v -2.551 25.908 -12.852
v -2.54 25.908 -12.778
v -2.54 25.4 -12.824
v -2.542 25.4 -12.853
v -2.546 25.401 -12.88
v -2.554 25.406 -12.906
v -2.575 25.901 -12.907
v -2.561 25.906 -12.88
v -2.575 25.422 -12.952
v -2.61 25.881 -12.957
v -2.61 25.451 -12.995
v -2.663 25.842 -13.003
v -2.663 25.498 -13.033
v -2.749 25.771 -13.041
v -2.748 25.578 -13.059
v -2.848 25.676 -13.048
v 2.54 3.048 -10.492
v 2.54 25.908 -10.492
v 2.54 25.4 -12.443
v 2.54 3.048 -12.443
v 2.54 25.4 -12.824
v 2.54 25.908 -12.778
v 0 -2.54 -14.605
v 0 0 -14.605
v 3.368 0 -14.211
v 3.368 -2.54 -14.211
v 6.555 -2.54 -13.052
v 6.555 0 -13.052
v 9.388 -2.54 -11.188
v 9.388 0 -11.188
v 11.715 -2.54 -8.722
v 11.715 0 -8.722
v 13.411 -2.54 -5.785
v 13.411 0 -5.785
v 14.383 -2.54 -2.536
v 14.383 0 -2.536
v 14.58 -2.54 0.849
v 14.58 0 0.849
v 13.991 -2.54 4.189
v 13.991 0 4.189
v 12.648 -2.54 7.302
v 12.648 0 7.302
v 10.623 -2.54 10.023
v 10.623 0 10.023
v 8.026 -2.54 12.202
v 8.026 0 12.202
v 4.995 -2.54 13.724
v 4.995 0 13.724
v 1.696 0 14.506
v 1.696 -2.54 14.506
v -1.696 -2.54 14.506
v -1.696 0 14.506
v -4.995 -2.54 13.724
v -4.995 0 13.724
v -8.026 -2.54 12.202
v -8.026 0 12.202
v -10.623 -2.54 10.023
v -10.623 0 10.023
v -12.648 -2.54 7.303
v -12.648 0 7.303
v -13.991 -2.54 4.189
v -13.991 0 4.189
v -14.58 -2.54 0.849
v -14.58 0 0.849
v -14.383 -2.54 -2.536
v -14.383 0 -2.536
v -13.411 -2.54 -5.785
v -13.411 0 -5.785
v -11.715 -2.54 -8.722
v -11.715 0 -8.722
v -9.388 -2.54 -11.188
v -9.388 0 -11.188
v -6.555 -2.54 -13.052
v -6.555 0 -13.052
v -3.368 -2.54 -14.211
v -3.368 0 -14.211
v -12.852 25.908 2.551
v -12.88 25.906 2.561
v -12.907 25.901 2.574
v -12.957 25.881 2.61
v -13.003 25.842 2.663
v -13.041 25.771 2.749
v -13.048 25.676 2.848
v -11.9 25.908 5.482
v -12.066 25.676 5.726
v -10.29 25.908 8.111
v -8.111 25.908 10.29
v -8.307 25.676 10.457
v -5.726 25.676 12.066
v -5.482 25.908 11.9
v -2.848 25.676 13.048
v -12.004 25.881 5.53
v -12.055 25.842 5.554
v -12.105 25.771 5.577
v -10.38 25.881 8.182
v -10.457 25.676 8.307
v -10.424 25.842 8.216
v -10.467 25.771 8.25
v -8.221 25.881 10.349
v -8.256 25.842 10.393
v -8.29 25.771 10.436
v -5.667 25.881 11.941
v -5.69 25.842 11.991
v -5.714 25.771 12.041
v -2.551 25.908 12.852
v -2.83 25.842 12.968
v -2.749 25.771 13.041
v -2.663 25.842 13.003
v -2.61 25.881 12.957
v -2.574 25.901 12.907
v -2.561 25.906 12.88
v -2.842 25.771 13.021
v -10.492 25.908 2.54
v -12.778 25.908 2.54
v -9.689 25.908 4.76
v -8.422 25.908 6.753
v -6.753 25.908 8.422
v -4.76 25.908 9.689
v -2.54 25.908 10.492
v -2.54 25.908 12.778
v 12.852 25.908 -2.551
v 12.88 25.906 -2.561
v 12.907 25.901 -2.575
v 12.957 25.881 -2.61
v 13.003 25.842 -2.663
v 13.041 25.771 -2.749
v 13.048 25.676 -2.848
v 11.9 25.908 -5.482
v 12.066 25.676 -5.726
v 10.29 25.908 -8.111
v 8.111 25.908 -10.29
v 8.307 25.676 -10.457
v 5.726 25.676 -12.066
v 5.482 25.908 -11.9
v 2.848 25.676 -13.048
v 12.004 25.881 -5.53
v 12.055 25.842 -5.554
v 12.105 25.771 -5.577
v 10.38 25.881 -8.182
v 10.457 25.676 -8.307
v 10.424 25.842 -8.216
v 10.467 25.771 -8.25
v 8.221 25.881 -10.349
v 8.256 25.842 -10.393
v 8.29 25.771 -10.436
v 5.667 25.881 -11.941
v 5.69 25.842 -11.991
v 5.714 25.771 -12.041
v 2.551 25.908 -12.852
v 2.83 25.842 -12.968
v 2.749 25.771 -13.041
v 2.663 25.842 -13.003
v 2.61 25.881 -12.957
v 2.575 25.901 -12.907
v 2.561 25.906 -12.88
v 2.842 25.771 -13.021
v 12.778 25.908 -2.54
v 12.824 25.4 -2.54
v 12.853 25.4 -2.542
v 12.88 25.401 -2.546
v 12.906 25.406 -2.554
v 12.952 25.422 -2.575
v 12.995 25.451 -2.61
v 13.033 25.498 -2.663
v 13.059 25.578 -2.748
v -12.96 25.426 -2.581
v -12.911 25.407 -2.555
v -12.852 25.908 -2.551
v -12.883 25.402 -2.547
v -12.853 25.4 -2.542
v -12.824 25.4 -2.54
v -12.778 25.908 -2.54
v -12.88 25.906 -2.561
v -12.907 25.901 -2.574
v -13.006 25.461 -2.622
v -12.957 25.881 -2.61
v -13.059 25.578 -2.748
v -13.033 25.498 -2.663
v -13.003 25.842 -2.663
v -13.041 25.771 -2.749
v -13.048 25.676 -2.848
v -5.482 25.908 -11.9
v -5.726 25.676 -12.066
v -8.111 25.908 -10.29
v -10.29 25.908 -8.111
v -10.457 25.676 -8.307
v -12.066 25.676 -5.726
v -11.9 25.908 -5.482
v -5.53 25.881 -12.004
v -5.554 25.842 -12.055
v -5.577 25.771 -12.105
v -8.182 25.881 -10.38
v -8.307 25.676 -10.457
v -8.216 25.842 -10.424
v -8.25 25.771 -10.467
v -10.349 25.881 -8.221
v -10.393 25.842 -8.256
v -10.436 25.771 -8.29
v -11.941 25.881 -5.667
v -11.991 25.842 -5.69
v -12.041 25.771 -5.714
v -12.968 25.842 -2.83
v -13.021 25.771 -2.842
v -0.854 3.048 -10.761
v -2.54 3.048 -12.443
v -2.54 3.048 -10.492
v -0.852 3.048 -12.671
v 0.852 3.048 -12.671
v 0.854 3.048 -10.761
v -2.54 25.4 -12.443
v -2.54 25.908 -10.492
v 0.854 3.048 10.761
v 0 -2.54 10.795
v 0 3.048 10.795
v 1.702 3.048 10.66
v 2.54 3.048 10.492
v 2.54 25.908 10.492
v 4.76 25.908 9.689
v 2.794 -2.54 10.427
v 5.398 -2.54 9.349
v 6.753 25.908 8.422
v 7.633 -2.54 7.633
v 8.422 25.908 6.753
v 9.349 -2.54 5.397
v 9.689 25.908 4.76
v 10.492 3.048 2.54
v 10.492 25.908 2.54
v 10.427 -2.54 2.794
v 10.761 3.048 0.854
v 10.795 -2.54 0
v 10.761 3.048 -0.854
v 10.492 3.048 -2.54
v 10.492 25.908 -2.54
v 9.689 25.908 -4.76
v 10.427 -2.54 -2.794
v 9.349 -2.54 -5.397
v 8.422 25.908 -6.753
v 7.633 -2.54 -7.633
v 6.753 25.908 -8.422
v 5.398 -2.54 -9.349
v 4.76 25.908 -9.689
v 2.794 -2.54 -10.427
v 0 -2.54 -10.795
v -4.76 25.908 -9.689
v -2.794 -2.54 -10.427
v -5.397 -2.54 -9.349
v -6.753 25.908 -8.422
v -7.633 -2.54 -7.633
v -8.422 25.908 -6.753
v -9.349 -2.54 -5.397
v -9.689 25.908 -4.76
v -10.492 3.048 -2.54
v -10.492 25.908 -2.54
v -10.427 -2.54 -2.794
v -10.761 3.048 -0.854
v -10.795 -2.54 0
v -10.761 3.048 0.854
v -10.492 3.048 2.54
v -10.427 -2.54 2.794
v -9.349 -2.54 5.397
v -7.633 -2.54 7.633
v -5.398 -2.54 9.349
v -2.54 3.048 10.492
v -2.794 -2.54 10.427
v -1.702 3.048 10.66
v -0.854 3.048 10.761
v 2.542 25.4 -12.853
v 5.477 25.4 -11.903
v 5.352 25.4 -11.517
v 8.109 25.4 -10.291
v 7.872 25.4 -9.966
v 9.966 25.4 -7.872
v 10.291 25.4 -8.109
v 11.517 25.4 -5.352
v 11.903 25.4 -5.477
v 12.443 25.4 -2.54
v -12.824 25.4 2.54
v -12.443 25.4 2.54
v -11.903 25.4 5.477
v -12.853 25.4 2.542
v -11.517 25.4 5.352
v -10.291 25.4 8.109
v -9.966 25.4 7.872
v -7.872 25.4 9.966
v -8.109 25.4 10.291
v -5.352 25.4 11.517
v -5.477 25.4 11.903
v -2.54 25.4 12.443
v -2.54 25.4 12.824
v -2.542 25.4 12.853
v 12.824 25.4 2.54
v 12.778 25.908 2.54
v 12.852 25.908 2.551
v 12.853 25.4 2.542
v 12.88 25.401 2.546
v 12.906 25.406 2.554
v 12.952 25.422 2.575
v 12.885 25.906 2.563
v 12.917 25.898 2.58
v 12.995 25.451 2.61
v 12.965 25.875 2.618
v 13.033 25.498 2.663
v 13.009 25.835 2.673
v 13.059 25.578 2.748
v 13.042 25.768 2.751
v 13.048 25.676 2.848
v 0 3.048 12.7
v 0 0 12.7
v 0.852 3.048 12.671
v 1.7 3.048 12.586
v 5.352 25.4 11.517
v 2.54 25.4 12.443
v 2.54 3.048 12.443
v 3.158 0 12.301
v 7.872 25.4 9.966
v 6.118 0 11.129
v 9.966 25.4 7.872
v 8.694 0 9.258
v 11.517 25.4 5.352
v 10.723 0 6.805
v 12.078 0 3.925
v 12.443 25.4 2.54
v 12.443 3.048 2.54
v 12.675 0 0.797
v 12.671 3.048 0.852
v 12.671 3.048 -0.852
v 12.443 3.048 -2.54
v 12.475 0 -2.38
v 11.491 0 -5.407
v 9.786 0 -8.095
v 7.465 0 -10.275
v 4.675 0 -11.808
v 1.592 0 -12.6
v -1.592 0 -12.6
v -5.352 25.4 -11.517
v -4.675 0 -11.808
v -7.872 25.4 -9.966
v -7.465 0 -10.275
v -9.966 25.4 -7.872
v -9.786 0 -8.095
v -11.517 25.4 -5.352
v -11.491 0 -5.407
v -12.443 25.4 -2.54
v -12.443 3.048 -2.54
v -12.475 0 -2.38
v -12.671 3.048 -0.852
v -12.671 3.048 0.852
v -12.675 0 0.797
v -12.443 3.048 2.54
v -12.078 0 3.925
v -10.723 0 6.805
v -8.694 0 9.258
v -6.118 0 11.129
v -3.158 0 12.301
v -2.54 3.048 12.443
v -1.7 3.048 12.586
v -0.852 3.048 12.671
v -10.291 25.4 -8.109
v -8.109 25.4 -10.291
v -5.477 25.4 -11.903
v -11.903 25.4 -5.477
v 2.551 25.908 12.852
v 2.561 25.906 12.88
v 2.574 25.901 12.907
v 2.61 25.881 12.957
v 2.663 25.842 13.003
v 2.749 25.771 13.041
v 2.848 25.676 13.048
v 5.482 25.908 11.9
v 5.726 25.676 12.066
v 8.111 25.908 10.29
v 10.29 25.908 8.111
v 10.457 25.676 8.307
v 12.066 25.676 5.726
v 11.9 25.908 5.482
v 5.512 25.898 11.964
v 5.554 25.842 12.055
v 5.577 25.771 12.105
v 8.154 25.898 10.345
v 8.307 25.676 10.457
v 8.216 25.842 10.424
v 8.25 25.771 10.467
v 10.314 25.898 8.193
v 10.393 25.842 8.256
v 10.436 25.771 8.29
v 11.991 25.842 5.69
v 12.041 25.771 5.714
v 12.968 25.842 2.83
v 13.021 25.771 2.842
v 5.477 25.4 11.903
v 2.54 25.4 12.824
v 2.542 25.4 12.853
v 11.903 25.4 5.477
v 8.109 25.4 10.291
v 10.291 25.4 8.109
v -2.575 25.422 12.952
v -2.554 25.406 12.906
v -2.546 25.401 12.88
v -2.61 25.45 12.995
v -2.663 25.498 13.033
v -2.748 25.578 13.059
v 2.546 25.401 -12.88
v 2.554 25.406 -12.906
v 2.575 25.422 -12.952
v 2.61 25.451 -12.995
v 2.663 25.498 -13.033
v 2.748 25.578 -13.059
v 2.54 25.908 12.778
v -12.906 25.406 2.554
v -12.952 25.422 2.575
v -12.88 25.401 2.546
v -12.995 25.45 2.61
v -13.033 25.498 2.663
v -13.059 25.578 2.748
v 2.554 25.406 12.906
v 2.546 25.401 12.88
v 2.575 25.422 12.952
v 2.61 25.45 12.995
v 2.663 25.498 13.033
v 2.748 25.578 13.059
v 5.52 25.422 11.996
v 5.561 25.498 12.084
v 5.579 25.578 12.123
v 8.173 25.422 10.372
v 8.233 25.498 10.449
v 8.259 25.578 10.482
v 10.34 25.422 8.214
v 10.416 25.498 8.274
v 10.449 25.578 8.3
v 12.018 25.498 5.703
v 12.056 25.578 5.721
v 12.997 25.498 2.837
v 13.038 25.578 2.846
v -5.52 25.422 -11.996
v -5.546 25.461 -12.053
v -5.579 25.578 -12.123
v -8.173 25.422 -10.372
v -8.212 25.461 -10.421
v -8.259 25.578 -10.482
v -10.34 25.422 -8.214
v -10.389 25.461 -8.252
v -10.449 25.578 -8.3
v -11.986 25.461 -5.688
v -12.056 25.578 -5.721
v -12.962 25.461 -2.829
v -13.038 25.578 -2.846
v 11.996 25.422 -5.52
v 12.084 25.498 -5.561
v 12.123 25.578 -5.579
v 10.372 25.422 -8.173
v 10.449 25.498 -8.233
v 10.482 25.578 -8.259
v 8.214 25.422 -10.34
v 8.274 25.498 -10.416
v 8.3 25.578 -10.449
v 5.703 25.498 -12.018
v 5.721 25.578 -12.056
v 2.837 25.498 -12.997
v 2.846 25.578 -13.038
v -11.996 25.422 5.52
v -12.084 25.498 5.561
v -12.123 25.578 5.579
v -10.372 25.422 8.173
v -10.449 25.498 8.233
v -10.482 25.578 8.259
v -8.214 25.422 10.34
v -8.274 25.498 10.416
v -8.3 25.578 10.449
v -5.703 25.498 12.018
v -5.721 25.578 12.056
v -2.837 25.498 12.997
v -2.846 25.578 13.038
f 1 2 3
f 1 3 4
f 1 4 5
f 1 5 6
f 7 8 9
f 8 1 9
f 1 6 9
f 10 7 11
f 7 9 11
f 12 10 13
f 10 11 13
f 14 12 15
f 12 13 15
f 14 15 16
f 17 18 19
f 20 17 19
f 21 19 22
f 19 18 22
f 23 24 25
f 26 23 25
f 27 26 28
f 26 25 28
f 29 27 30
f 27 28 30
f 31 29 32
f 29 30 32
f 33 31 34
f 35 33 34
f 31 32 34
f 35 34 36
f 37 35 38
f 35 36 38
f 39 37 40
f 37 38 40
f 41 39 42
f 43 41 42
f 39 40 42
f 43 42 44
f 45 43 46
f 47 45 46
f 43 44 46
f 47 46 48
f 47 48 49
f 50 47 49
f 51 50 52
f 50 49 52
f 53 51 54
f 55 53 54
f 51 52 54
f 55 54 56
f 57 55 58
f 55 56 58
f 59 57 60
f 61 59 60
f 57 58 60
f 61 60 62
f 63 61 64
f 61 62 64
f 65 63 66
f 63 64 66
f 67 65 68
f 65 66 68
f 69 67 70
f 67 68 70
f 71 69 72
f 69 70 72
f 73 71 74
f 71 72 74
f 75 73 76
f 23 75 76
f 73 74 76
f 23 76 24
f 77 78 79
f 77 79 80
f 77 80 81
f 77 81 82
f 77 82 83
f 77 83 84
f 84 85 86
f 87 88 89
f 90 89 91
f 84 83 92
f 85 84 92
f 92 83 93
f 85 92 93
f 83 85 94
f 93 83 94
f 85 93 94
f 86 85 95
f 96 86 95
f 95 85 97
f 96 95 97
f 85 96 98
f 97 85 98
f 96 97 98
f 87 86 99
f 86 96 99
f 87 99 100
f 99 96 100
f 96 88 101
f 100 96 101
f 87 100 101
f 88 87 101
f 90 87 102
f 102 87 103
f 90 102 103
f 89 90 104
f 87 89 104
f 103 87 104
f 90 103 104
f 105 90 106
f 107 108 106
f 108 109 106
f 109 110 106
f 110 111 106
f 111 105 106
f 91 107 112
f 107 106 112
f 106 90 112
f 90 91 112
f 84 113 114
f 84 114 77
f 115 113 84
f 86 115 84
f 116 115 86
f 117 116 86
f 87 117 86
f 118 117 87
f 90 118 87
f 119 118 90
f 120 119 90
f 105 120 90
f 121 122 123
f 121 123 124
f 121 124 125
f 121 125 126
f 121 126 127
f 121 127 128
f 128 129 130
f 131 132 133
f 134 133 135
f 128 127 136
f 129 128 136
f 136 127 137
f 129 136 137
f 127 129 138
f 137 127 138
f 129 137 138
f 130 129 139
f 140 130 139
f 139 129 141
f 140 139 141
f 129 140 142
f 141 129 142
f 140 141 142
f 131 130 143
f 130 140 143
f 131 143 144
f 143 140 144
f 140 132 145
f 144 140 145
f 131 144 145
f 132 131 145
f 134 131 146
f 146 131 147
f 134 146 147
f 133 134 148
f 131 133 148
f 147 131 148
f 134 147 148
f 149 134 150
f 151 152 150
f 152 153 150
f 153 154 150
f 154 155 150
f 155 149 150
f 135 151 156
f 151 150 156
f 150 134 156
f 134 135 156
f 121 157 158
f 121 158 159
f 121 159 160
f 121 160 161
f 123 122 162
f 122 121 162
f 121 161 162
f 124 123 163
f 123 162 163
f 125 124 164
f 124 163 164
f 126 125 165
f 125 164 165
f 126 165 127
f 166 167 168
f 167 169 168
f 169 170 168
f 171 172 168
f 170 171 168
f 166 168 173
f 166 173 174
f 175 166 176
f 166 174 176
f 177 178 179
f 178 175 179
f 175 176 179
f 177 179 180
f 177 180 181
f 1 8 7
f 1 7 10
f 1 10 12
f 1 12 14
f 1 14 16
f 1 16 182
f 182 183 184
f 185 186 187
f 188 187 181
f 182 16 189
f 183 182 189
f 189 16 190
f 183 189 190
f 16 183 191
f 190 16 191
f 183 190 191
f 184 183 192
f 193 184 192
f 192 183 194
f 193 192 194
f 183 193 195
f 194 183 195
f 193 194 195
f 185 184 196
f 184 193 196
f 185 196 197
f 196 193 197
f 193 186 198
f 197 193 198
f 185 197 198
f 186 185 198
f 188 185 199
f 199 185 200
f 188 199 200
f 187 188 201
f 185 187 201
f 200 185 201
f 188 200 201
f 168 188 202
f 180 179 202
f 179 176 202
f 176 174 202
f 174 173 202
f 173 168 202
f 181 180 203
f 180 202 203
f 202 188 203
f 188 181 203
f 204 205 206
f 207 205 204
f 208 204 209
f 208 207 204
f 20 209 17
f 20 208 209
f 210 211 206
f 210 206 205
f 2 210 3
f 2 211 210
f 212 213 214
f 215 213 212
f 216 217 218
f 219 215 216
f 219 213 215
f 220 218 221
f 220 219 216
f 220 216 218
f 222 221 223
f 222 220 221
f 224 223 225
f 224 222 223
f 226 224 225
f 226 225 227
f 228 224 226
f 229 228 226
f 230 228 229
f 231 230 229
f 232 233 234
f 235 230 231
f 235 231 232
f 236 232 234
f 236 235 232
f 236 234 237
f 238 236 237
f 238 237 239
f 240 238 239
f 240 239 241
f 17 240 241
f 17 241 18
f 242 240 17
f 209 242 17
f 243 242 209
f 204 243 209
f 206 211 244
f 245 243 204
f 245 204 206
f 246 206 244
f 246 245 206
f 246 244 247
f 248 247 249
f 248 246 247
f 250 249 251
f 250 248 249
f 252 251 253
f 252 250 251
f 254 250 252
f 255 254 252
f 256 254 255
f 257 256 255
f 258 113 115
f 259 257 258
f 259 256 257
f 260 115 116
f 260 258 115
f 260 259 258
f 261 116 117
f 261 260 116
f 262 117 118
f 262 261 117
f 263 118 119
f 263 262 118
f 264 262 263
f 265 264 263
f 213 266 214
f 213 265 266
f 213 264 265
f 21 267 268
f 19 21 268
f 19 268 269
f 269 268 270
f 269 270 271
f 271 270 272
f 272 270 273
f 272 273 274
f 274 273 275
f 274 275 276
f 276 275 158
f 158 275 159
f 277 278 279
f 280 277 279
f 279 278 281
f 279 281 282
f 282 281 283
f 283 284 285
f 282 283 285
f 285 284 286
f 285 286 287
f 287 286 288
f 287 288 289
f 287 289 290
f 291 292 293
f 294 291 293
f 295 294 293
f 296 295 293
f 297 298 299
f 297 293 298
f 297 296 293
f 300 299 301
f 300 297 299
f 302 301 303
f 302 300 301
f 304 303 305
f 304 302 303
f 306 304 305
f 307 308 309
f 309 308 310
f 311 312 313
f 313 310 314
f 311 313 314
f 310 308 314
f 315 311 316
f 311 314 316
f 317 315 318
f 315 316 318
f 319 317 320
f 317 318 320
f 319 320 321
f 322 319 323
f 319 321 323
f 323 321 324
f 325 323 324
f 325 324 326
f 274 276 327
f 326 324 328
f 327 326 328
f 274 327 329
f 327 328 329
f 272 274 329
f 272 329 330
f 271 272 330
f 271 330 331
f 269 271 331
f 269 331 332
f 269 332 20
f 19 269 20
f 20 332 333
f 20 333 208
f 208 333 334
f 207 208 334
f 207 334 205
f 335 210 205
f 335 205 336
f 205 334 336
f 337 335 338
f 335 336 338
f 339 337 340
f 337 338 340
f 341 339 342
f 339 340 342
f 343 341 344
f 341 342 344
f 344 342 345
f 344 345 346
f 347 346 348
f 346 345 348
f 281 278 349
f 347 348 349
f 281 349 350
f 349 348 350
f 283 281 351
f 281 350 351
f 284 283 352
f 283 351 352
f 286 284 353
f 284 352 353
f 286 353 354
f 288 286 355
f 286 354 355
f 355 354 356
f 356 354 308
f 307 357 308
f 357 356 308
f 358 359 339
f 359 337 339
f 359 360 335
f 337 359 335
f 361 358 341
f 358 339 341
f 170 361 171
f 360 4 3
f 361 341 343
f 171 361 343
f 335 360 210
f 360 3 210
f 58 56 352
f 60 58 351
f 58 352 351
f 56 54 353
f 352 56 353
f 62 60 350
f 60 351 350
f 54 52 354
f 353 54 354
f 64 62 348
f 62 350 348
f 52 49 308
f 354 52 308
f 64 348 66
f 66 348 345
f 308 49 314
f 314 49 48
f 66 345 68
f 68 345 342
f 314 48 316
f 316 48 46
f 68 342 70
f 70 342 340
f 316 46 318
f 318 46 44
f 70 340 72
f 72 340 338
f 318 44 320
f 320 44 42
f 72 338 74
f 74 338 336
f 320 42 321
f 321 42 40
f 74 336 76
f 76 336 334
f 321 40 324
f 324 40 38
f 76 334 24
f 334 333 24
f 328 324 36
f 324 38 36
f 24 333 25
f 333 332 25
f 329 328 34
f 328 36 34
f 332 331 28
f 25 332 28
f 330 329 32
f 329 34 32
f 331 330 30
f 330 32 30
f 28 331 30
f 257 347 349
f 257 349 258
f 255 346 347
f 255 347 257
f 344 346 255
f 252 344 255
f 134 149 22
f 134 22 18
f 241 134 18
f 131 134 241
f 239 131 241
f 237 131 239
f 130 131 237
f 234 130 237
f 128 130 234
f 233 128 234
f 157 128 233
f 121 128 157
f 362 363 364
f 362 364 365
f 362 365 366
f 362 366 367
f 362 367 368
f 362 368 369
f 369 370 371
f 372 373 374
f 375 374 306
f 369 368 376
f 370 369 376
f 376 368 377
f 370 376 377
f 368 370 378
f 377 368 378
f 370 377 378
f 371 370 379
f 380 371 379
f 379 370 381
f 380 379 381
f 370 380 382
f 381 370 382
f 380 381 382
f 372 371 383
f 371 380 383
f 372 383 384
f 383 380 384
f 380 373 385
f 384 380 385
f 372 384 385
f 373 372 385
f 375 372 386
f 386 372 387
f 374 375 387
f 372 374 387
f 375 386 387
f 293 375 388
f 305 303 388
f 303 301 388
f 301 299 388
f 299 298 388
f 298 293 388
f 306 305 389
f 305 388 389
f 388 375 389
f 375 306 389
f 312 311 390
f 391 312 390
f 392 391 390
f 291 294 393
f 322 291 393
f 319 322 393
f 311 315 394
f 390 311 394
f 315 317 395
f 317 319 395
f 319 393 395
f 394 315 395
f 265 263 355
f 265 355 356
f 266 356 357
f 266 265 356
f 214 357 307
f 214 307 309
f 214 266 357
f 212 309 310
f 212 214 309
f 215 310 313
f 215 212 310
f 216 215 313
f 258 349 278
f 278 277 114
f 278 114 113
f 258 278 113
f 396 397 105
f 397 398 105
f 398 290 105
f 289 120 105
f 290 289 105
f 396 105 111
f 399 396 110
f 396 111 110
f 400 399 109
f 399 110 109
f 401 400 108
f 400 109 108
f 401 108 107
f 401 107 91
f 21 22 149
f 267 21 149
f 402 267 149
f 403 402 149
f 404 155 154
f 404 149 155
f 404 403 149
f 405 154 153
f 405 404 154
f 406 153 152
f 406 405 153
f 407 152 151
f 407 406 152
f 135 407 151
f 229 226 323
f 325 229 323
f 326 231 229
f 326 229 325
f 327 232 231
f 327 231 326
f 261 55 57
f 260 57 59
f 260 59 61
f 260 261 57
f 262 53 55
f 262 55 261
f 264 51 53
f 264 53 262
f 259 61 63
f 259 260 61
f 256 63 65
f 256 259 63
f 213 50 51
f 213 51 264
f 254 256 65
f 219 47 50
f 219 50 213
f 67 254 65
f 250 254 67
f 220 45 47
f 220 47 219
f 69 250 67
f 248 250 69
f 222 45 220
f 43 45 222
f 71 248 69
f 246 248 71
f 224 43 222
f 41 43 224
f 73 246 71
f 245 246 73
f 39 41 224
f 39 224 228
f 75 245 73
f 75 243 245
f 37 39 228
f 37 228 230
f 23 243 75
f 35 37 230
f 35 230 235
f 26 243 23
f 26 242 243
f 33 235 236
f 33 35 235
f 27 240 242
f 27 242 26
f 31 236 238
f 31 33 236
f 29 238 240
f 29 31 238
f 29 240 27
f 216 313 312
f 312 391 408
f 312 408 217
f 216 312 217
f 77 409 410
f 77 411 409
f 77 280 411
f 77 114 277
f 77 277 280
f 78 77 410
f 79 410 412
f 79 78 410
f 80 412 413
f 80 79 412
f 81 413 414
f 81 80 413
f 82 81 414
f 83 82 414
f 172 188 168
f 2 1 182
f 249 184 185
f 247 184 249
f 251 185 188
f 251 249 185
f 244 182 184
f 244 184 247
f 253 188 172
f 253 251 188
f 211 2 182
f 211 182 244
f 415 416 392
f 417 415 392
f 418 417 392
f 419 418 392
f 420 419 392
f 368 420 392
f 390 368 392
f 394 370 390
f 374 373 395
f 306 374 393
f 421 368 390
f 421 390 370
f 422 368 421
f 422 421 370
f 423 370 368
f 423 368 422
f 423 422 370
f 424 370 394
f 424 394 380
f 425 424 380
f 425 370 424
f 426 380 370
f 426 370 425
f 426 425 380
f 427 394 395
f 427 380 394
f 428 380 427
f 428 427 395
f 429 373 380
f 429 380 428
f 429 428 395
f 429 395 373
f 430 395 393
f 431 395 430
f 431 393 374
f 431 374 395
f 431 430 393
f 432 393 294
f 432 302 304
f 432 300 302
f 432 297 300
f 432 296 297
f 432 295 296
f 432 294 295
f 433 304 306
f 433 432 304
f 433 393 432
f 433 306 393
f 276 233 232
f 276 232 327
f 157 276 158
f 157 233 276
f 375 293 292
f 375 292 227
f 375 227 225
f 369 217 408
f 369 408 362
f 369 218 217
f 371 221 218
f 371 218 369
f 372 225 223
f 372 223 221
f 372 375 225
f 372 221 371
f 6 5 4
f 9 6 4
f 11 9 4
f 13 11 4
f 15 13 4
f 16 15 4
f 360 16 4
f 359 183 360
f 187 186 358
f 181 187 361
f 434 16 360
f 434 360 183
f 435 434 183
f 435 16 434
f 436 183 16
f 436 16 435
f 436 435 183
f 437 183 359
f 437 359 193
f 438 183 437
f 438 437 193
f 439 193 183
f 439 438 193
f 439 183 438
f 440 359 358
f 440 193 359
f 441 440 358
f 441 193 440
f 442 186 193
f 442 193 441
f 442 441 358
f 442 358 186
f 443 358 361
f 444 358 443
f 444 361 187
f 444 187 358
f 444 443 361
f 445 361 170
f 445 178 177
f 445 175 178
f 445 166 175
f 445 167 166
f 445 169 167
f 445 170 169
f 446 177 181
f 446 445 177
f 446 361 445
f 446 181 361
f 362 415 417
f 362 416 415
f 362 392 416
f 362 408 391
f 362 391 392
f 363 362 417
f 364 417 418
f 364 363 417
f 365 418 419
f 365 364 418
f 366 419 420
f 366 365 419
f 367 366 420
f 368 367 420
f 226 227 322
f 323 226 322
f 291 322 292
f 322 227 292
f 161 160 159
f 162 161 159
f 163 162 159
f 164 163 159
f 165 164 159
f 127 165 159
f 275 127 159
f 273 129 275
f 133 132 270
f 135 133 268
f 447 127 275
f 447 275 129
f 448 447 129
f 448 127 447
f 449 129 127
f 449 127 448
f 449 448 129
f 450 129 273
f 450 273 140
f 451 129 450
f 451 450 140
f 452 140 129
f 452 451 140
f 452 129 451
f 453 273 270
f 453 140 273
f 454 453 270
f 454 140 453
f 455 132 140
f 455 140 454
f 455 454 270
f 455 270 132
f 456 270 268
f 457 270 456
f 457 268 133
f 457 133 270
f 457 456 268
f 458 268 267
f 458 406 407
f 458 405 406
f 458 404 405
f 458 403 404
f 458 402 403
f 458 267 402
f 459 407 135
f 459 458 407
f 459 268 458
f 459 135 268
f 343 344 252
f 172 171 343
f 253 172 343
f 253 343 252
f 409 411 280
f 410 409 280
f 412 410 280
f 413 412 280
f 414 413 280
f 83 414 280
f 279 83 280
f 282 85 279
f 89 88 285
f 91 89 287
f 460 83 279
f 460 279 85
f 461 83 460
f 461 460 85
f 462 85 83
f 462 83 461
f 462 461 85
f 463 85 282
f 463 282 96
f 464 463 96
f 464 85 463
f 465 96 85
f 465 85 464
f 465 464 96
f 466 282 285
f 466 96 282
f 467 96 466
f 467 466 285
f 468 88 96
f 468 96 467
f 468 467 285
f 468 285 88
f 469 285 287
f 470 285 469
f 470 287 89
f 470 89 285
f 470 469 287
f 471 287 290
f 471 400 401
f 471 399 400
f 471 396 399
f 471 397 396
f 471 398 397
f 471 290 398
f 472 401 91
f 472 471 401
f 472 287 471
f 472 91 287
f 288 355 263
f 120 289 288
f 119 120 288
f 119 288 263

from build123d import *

# Parameters (mm, degrees)
SKETCH1_R               = 12.7
BOSS_EXTRUDE1_DEPTH     = 25.4
SKETCH2_R               = 13.335
BOSS_EXTRUDE2_DEPTH     = 0.508
DRAFT1_ANGLE            = 5
SKETCH5_R               = 14.605
BOSS_EXTRUDE3_DEPTH     = 2.54
CUT_EXTRUDE1_DEPTH      = 36.155380157
CUT_EXTRUDE1_DEPTH_BACK = 36.155380157
SKETCH3_R               = 10.795
SKETCH4_W               = 30.48
SKETCH4_H               = 5.08
SKETCH4_W_2             = 5.08
SKETCH4_H_2             = 30.48
CUT_EXTRUDE2_DEPTH      = 22.86
FILLET3_R               = 0.254


with BuildPart() as part:
    # Sketch1 → Boss-Extrude1 (new body)
    with BuildSketch(Plane(origin=(0, 0, 0), x_dir=(1, 0, 0), z_dir=(0, 1, 0))):
        with Locations(Location((0, 0, 0), (0, 0, 270))):
            Circle(SKETCH1_R)
    extrude(amount=BOSS_EXTRUDE1_DEPTH)

    # Sketch2 → Boss-Extrude2 (add)
    with BuildSketch(Plane(origin=(0, 25.4, 0), x_dir=(1, 0, 0), z_dir=(0, 1, 0))):
        with Locations(Location((0, 0, 0), (0, 0, 270))):
            Circle(SKETCH2_R)
    extrude(amount=BOSS_EXTRUDE2_DEPTH)

    # Draft1
    draft1_faces = [part.faces().sort_by_distance(p)[0] for p in [
        (0, 25.654, -13.335),
    ]]
    draft(draft1_faces, Plane.ZX.offset(25.908), DRAFT1_ANGLE)

    # Sketch5 → Boss-Extrude3 (add)
    with BuildSketch(Plane.XZ):
        with Locations(Location((0, 0, 0), (0, 0, 270))):
            Circle(SKETCH5_R)
    extrude(amount=BOSS_EXTRUDE3_DEPTH)

    # Sketch3 → Cut-Extrude1 (cut, two sides: drawn at the far end of the back side and taken through both)
    with BuildSketch(Plane(origin=(0, 25.908, 0), x_dir=(1, 0, 0), z_dir=(0, 1, 0)).offset(-CUT_EXTRUDE1_DEPTH_BACK)):
        with Locations(Location((0, 0, 0), (0, 0, 270))):
            Circle(SKETCH3_R)
    extrude(amount=CUT_EXTRUDE1_DEPTH + CUT_EXTRUDE1_DEPTH_BACK, mode=Mode.SUBTRACT)

    # Sketch4 → Cut-Extrude2 (cut)
    with BuildSketch(Plane(origin=(0, 25.908, 0), x_dir=(1, 0, 0), z_dir=(0, 1, 0))):
        Rectangle(SKETCH4_W, SKETCH4_H)
        Rectangle(SKETCH4_W_2, SKETCH4_H_2)
    extrude(amount=-CUT_EXTRUDE2_DEPTH, mode=Mode.SUBTRACT)

    # Fillet3
    fillet3_edges = [part.edges().sort_by_distance(p)[0] for p in [
        (-2.54, 25.654219214, -13.113476672),
        (-2.54, 25.654219214, 13.113476672),
        (-9.460695751, 25.4, 9.460695751),
        (-13.113476672, 25.654219214, 2.54),
        (13.113476672, 25.654219214, 2.54),
        (-9.429268927, 25.908, 9.429268927),
        (-9.460695751, 25.4, -9.460695751),
        (-9.429268927, 25.908, -9.429268927),
        (-13.113476672, 25.654219214, -2.54),
        (13.113476672, 25.654219214, -2.54),
        (9.429268927, 25.908, -9.429268927),
        (2.54, 25.654219214, -13.113476672),
        (2.54, 25.654219214, 13.113476672),
        (9.460695751, 25.4, -9.460695751),
        (9.460695751, 25.4, 9.460695751),
        (9.429268927, 25.908, 9.429268927),
    ]]
    fillet(fillet3_edges, radius=FILLET3_R - 0.0001)  # a hair under: the kernel refuses the full size


solid = part.part
